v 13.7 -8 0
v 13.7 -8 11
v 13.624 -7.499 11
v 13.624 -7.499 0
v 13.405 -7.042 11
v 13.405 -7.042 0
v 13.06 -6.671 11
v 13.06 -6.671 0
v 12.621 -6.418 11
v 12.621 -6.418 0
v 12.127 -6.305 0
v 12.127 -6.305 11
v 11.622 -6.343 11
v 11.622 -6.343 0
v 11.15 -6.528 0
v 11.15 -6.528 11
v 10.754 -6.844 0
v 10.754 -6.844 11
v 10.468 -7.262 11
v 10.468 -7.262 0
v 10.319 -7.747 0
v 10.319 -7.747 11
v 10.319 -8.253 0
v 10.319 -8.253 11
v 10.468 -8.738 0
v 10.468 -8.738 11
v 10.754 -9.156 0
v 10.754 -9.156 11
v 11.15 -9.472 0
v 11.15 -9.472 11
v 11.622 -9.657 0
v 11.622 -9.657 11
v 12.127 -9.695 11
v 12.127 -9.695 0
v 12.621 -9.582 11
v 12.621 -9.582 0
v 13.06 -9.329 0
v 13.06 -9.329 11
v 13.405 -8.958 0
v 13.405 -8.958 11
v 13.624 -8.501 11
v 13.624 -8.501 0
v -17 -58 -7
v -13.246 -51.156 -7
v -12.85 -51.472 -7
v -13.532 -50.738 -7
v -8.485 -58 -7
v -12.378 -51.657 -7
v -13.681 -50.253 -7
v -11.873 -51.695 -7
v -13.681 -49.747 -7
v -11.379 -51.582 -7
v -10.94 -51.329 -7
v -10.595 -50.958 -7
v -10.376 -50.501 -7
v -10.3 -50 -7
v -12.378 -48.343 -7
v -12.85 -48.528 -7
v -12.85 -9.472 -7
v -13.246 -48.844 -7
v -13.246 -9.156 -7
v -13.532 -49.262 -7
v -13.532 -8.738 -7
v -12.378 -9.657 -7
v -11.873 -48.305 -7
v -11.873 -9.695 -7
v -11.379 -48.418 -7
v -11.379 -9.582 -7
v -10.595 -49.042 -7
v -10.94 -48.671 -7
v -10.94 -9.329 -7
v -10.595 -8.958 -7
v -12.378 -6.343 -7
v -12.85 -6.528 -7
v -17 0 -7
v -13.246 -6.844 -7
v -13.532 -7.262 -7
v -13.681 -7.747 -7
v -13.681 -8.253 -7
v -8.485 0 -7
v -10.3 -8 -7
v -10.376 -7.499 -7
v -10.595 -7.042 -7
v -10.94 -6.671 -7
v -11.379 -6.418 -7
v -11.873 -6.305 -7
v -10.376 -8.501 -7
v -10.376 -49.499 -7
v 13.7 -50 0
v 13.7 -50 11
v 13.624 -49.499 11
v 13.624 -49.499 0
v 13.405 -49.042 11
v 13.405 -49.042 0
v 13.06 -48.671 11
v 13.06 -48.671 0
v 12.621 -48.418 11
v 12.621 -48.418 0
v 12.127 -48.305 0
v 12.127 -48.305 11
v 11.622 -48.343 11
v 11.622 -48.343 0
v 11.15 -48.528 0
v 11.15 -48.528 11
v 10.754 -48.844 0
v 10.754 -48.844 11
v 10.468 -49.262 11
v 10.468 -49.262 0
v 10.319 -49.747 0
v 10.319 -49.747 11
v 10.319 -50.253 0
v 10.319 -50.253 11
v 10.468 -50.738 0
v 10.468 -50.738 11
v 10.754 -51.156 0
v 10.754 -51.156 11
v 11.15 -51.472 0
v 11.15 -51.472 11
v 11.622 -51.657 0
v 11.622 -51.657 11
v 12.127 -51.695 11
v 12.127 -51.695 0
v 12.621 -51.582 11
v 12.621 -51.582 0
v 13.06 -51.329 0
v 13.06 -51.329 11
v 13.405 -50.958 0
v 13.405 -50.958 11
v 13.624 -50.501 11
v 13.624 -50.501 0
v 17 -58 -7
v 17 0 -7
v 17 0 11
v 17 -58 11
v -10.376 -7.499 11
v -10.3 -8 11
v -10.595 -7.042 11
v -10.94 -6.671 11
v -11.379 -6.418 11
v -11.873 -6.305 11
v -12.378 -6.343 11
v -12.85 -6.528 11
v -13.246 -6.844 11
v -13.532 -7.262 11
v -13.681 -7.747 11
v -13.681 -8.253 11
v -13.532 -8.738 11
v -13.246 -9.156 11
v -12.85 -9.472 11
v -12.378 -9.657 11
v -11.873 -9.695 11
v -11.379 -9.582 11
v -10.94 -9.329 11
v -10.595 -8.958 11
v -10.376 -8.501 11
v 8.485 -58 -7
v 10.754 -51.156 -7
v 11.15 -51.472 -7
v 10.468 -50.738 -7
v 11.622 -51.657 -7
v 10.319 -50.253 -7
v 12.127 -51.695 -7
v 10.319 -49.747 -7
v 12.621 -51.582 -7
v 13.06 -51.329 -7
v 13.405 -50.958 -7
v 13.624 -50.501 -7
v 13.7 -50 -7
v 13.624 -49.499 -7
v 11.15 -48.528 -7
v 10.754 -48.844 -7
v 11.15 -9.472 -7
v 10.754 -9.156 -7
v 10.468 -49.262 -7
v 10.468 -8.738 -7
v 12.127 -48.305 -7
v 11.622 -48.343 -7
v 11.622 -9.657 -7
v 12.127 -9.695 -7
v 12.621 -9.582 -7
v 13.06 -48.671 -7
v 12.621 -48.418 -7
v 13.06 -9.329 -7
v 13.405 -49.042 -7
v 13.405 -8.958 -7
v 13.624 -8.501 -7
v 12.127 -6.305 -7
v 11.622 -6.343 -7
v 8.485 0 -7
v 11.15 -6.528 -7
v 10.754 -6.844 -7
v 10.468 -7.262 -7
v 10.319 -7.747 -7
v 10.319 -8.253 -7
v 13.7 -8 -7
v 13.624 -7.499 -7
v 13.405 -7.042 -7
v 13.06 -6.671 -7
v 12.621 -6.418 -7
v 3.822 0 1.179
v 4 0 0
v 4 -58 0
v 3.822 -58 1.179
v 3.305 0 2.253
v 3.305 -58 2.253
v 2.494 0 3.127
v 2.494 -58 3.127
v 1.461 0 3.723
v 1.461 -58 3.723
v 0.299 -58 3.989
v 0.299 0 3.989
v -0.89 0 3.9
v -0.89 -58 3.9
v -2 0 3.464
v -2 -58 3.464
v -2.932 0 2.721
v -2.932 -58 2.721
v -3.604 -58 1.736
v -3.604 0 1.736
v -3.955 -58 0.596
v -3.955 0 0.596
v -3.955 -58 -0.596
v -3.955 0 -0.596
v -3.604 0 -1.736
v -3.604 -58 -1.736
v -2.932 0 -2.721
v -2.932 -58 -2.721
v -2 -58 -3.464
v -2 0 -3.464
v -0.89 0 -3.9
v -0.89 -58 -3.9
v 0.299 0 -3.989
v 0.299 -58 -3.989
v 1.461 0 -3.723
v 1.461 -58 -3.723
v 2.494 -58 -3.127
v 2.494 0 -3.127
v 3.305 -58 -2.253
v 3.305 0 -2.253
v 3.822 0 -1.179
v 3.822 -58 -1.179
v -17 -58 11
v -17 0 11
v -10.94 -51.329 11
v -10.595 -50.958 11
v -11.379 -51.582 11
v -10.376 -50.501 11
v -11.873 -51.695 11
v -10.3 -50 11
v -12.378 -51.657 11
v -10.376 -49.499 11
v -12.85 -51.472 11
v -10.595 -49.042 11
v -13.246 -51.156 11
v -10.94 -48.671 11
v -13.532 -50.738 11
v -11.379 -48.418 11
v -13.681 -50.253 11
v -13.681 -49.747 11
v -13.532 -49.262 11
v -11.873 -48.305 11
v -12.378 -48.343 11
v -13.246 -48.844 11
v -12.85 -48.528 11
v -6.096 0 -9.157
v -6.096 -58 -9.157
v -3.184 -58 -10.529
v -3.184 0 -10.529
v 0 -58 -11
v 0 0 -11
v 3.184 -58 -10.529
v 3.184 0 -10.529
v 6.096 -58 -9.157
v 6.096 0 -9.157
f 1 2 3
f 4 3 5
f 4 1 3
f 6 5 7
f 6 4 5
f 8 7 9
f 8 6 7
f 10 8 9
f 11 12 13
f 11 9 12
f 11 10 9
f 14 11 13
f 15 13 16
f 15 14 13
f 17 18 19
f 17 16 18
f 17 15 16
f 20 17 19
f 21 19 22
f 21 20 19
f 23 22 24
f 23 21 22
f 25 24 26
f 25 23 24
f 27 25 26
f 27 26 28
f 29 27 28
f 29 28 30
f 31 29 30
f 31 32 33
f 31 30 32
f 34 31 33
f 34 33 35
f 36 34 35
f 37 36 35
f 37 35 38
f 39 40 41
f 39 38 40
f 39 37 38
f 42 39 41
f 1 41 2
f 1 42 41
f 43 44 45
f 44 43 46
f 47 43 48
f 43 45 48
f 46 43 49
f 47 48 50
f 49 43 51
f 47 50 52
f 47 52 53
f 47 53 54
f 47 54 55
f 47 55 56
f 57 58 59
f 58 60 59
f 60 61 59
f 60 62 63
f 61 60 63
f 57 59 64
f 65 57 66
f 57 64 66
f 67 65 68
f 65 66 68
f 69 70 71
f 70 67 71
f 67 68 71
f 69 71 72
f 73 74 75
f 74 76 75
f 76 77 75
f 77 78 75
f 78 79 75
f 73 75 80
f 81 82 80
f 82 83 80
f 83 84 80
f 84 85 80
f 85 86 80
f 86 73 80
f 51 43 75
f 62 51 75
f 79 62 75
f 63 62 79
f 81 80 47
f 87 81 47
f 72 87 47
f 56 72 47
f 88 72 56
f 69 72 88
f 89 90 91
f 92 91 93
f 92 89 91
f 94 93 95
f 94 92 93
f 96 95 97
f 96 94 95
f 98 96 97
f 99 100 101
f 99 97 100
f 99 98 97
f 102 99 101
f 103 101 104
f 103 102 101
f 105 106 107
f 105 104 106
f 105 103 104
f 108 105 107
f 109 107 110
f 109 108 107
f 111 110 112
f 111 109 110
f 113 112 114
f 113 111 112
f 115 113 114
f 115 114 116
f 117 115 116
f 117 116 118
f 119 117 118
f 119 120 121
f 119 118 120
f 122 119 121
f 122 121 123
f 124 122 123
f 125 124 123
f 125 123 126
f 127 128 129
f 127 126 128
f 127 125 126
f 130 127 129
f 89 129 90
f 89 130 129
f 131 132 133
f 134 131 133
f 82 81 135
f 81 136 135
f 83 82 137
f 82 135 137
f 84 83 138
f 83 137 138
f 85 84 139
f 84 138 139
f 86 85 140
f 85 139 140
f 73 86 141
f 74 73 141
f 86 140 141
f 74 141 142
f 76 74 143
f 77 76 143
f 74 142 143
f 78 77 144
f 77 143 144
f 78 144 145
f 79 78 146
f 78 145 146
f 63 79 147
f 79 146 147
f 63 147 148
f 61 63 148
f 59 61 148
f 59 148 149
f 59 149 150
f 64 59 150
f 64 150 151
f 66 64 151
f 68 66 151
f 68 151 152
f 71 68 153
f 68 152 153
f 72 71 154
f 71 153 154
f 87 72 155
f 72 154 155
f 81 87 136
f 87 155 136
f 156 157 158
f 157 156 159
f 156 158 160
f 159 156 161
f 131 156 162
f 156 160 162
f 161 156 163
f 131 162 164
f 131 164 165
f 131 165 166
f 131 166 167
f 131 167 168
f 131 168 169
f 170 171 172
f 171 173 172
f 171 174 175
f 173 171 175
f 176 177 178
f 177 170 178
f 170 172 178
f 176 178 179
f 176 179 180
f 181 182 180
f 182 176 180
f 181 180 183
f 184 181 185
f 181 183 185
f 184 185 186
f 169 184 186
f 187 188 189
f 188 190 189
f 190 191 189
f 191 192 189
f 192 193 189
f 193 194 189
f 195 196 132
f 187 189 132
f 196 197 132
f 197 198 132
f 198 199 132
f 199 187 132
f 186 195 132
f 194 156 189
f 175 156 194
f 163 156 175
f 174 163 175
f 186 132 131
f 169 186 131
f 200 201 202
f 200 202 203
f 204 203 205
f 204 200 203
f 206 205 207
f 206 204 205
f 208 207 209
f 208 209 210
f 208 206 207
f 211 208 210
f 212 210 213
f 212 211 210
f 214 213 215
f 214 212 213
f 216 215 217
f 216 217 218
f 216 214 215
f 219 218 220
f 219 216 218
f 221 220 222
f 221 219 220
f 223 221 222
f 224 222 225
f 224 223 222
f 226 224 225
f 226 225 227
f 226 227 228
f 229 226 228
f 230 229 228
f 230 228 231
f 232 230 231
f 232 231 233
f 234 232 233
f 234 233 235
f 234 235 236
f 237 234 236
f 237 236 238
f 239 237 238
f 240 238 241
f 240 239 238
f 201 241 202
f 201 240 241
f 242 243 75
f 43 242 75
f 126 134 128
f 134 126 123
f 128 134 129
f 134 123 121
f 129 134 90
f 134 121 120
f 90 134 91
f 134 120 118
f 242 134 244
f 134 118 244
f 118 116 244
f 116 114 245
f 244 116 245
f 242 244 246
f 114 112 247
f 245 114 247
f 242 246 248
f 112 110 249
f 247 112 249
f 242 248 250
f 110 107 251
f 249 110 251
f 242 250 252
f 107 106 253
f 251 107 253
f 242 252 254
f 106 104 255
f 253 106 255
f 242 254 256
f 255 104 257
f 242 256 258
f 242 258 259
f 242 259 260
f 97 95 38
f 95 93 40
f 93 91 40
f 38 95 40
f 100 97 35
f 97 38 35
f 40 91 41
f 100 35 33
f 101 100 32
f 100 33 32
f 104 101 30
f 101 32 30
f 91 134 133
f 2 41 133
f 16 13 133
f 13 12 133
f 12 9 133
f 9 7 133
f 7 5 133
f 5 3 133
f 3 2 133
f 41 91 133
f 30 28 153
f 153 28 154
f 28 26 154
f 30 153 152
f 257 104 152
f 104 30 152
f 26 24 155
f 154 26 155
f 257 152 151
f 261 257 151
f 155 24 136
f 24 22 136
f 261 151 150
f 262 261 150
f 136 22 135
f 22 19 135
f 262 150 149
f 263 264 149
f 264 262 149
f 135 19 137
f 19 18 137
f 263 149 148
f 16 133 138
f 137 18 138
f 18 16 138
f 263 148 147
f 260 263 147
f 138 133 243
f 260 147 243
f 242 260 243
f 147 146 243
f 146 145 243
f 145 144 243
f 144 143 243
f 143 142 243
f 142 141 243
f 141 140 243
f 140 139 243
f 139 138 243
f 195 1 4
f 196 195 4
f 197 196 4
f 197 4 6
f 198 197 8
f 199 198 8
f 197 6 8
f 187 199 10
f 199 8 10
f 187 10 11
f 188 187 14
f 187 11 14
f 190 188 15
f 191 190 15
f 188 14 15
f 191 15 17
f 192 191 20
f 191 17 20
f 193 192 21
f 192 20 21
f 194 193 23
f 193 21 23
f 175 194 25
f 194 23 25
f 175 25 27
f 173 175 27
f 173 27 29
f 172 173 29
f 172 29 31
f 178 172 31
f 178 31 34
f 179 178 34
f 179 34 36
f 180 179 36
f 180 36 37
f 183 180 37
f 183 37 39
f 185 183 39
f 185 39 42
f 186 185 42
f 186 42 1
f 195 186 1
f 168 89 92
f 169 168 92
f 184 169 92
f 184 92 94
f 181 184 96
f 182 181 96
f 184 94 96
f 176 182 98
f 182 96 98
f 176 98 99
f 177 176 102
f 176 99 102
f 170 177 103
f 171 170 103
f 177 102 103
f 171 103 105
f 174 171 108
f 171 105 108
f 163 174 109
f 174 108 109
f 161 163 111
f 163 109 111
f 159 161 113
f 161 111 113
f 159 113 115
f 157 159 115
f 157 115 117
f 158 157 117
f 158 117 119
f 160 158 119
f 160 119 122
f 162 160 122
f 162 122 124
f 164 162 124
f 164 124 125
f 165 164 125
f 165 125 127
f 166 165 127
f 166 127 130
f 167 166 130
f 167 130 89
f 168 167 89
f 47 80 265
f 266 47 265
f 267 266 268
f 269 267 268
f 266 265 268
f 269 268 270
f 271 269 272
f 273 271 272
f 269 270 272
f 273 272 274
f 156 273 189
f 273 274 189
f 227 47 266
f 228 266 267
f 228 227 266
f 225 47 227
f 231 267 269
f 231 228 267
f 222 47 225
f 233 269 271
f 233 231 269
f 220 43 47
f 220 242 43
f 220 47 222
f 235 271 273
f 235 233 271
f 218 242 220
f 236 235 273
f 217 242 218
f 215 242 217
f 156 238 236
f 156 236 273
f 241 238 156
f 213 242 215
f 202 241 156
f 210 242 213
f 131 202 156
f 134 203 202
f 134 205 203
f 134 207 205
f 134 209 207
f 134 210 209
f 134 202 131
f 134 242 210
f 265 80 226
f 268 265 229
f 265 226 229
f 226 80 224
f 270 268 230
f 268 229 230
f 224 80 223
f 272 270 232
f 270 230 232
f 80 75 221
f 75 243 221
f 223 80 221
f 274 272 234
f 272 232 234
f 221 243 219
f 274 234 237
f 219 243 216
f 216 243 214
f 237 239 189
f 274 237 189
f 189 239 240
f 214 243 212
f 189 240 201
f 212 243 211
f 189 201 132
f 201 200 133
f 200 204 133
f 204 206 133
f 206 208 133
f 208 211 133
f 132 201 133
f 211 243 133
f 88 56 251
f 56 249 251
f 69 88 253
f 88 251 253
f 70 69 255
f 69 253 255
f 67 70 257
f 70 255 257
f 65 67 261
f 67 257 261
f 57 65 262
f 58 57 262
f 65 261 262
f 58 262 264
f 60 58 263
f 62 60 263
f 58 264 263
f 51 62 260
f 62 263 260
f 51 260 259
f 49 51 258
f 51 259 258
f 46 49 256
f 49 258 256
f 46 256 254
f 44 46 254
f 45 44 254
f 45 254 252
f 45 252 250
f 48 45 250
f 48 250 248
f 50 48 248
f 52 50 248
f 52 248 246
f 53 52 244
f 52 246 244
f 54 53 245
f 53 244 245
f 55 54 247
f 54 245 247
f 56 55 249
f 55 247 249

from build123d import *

# Parameters (mm, degrees)
F0_R     = 4
F1_DEPTH = 58
F2_R     = 1.7
F3_DEPTH = 11.001
F4_DEPTH = 11.001
F5_DEPTH = 50


# Not quite as in the source:
# - a feature names something its author has since deleted; it is built from what else it names


with BuildPart() as f1:
    # F0 (on Front) → F1 (new body)
    with BuildSketch(Plane.XZ):
        with BuildLine():
            Line((-17, -7), (-8.4852813742, -7))
            ThreePointArc((-8.4852813742, -7), (0, -11), (8.4852813742, -7))
            Line((8.4852813742, -7), (17, -7))
            Line((17, -7), (17, 11))
            Line((17, 11), (-17, 11))
            Line((-17, 11), (-17, -7))
        make_face()
        Circle(F0_R, mode=Mode.SUBTRACT)
    extrude(amount=F1_DEPTH)

    # F2 (on Top) → F3 (cut, through all)
    with BuildSketch(Plane.XY):
        with Locations((-12, -8)):
            Circle(F2_R)
        with Locations((12, -8)):
            Circle(F2_R)
        with Locations((12, -50)):
            Circle(F2_R)
        with Locations((-12, -50)):
            Circle(F2_R)
    extrude(amount=-F3_DEPTH, mode=Mode.SUBTRACT)

    # F2 (on Top) → F4 (cut, through all)
    with BuildSketch(Plane.XY):
        with Locations((-12, -8)):
            Circle(F2_R)
        with Locations((12, -8)):
            Circle(F2_R)
        with Locations((12, -50)):
            Circle(F2_R)
        with Locations((-12, -50)):
            Circle(F2_R)
    extrude(amount=-F4_DEPTH, mode=Mode.SUBTRACT)

    # F2 (on Top) → F5 (cut)
    with BuildSketch(Plane.XY):
        with Locations((-12, -8)):
            Circle(F2_R)
        with Locations((12, -8)):
            Circle(F2_R)
        with Locations((12, -50)):
            Circle(F2_R)
        with Locations((-12, -50)):
            Circle(F2_R)
    extrude(amount=F5_DEPTH, mode=Mode.SUBTRACT)


solid = f1.part
